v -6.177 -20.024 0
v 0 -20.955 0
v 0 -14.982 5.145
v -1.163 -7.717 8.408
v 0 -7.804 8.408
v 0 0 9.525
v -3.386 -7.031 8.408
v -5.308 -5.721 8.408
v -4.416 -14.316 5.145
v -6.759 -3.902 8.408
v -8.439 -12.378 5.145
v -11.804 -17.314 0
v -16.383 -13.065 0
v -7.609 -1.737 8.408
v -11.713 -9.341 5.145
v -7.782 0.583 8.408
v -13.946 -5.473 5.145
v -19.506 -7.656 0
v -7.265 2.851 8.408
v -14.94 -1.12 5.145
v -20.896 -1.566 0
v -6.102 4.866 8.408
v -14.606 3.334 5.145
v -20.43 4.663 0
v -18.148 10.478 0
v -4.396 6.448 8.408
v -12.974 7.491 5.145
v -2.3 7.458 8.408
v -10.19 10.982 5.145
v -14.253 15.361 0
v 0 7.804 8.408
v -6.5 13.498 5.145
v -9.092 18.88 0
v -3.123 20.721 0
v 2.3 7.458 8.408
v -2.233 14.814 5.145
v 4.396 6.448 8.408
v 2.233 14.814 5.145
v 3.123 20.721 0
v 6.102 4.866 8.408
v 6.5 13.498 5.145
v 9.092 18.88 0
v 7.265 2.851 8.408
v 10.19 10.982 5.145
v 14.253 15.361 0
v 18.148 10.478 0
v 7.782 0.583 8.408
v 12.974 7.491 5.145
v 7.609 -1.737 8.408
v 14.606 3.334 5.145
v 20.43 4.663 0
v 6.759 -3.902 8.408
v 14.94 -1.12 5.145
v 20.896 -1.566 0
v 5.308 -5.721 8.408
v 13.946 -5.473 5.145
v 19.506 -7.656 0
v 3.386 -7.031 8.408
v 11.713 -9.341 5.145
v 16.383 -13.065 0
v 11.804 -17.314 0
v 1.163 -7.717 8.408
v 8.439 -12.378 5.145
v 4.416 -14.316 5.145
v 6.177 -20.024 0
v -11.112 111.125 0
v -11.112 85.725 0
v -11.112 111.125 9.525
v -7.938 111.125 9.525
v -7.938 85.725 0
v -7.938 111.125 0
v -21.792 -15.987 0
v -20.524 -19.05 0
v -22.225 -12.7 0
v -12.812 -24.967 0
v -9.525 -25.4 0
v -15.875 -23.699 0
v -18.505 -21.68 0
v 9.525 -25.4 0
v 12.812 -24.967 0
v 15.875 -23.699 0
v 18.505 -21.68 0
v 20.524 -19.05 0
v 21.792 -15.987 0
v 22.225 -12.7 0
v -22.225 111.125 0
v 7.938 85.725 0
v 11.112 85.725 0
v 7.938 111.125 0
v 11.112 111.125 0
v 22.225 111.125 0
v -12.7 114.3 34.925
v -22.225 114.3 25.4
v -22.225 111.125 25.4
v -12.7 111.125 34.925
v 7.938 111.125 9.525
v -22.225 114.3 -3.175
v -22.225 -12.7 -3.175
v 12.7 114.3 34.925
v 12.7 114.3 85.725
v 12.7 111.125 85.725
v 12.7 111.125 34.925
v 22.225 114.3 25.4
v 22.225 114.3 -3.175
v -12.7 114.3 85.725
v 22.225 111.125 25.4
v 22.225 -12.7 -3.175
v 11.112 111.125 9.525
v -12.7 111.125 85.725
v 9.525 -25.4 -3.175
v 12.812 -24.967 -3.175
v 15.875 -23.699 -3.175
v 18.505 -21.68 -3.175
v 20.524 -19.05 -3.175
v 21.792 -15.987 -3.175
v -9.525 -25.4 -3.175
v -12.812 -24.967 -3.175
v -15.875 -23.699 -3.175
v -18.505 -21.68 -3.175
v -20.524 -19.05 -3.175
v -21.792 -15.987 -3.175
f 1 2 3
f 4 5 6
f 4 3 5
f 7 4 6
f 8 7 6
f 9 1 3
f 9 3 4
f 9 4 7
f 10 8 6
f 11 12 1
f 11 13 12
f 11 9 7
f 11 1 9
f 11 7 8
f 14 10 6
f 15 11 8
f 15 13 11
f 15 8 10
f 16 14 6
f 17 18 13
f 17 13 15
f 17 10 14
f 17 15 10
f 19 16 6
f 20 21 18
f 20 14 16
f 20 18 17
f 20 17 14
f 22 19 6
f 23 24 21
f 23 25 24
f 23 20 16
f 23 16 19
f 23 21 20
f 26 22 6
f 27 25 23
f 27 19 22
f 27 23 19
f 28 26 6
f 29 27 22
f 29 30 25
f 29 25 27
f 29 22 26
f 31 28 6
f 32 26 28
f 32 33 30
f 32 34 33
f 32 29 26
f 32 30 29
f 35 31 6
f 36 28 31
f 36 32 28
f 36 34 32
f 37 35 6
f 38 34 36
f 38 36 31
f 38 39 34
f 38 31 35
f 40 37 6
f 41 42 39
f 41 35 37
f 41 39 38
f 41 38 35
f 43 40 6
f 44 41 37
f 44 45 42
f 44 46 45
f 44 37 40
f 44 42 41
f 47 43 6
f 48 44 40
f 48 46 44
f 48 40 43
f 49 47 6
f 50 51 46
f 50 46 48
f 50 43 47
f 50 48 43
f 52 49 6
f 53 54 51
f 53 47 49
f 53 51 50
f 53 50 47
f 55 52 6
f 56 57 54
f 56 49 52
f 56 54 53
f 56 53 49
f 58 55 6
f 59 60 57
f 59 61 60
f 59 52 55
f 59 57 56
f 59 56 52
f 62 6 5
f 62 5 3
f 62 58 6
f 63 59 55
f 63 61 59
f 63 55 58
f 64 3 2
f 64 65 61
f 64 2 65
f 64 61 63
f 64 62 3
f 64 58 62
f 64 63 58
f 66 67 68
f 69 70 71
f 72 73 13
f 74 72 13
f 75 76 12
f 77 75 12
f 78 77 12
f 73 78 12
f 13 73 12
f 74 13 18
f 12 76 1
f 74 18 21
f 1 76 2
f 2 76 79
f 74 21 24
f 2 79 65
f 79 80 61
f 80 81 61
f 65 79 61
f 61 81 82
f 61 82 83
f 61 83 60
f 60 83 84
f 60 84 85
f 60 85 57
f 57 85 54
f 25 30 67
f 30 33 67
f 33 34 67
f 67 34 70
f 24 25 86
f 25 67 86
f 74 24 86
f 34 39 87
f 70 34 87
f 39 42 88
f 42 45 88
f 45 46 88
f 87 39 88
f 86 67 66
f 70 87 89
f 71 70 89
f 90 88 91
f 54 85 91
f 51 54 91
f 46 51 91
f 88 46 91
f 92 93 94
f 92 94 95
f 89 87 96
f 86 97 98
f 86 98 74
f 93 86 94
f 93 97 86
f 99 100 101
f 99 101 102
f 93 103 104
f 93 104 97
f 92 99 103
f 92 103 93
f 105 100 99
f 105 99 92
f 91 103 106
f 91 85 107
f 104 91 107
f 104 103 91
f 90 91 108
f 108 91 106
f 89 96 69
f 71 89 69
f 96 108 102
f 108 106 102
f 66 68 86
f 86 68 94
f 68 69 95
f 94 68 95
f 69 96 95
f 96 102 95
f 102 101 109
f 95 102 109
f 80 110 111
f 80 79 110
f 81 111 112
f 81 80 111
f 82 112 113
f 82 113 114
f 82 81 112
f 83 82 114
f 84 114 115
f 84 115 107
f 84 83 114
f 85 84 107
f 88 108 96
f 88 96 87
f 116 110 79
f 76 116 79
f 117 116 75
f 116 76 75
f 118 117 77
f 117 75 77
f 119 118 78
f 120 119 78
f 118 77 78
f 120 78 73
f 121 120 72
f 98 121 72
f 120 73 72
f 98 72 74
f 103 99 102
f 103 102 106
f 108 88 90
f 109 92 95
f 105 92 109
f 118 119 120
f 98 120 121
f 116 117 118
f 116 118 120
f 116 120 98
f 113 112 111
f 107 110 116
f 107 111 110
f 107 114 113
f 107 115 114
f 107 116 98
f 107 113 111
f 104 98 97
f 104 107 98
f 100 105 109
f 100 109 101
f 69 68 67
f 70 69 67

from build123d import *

# Parameters (mm, degrees)
F0_W     = 139.7
F0_H     = 3.175
F1_DEPTH = 22.225
F4_R     = 12.7
F6_DEPTH = 3.175
F9_DEPTH = 1.5875


# Not quite as in the source:
# - a pattern or mirror of a feature is missing from the dataset's text; its kind, count and spacing are read off the source's solid


with BuildPart() as f1:
    # F0 (on Right) → F1 (new body, symmetric)
    with BuildSketch(Plane.YZ):
        with Locations((44.45, -1.5875)):
            Rectangle(F0_W, F0_H)
    extrude(amount=F1_DEPTH, both=True)

    # F2 (on Right) → F3 (revolve)
    with BuildSketch(Plane.YZ):
        with BuildLine():
            Line((0, 0), (0, 9.525))
            ThreePointArc((0, 9.525), (-11.5091012898, 7.0320228377), (-20.955, 0))
            Line((-20.955, 0), (0, 0))
        make_face()
    revolve(axis=Axis((0, 0, 4.7625), (0, 0, -1)))

    # F4
    f4_edges = [f1.edges().sort_by_distance(p)[0] for p in [
        (22.225, -25.4, -1.5875),
        (-22.225, -25.4, -1.5875),
    ]]
    fillet(f4_edges, radius=F4_R)

    # F5 (on face) → F6 (join)
    with BuildSketch(Plane(origin=(0, 114.3, 0), x_dir=(-1, 0, 0), z_dir=(0, 1, 0))):
        Polygon((-22.225, 25.4), (-22.225, 0), (22.225, 0), (22.225, 25.4), (12.7, 34.925), (12.7, 85.725), (-12.7, 85.725), (-12.7, 34.925), align=None)
    extrude(amount=-F6_DEPTH)

    # F8 (on offset) → F9 (join, symmetric)
    with BuildSketch(Plane.YZ.offset(9.525)):
        Polygon((111.125, 0), (111.125, 9.525), (85.725, 0), align=None)
    f9 = extrude(amount=F9_DEPTH, both=True)

    # F9_copies: F9 across plane
    add(f9.mirror(Plane(origin=(0, 0, 0), x_dir=(0, 0, -1), z_dir=(-1, 0, 0))))


solid = f1.part
